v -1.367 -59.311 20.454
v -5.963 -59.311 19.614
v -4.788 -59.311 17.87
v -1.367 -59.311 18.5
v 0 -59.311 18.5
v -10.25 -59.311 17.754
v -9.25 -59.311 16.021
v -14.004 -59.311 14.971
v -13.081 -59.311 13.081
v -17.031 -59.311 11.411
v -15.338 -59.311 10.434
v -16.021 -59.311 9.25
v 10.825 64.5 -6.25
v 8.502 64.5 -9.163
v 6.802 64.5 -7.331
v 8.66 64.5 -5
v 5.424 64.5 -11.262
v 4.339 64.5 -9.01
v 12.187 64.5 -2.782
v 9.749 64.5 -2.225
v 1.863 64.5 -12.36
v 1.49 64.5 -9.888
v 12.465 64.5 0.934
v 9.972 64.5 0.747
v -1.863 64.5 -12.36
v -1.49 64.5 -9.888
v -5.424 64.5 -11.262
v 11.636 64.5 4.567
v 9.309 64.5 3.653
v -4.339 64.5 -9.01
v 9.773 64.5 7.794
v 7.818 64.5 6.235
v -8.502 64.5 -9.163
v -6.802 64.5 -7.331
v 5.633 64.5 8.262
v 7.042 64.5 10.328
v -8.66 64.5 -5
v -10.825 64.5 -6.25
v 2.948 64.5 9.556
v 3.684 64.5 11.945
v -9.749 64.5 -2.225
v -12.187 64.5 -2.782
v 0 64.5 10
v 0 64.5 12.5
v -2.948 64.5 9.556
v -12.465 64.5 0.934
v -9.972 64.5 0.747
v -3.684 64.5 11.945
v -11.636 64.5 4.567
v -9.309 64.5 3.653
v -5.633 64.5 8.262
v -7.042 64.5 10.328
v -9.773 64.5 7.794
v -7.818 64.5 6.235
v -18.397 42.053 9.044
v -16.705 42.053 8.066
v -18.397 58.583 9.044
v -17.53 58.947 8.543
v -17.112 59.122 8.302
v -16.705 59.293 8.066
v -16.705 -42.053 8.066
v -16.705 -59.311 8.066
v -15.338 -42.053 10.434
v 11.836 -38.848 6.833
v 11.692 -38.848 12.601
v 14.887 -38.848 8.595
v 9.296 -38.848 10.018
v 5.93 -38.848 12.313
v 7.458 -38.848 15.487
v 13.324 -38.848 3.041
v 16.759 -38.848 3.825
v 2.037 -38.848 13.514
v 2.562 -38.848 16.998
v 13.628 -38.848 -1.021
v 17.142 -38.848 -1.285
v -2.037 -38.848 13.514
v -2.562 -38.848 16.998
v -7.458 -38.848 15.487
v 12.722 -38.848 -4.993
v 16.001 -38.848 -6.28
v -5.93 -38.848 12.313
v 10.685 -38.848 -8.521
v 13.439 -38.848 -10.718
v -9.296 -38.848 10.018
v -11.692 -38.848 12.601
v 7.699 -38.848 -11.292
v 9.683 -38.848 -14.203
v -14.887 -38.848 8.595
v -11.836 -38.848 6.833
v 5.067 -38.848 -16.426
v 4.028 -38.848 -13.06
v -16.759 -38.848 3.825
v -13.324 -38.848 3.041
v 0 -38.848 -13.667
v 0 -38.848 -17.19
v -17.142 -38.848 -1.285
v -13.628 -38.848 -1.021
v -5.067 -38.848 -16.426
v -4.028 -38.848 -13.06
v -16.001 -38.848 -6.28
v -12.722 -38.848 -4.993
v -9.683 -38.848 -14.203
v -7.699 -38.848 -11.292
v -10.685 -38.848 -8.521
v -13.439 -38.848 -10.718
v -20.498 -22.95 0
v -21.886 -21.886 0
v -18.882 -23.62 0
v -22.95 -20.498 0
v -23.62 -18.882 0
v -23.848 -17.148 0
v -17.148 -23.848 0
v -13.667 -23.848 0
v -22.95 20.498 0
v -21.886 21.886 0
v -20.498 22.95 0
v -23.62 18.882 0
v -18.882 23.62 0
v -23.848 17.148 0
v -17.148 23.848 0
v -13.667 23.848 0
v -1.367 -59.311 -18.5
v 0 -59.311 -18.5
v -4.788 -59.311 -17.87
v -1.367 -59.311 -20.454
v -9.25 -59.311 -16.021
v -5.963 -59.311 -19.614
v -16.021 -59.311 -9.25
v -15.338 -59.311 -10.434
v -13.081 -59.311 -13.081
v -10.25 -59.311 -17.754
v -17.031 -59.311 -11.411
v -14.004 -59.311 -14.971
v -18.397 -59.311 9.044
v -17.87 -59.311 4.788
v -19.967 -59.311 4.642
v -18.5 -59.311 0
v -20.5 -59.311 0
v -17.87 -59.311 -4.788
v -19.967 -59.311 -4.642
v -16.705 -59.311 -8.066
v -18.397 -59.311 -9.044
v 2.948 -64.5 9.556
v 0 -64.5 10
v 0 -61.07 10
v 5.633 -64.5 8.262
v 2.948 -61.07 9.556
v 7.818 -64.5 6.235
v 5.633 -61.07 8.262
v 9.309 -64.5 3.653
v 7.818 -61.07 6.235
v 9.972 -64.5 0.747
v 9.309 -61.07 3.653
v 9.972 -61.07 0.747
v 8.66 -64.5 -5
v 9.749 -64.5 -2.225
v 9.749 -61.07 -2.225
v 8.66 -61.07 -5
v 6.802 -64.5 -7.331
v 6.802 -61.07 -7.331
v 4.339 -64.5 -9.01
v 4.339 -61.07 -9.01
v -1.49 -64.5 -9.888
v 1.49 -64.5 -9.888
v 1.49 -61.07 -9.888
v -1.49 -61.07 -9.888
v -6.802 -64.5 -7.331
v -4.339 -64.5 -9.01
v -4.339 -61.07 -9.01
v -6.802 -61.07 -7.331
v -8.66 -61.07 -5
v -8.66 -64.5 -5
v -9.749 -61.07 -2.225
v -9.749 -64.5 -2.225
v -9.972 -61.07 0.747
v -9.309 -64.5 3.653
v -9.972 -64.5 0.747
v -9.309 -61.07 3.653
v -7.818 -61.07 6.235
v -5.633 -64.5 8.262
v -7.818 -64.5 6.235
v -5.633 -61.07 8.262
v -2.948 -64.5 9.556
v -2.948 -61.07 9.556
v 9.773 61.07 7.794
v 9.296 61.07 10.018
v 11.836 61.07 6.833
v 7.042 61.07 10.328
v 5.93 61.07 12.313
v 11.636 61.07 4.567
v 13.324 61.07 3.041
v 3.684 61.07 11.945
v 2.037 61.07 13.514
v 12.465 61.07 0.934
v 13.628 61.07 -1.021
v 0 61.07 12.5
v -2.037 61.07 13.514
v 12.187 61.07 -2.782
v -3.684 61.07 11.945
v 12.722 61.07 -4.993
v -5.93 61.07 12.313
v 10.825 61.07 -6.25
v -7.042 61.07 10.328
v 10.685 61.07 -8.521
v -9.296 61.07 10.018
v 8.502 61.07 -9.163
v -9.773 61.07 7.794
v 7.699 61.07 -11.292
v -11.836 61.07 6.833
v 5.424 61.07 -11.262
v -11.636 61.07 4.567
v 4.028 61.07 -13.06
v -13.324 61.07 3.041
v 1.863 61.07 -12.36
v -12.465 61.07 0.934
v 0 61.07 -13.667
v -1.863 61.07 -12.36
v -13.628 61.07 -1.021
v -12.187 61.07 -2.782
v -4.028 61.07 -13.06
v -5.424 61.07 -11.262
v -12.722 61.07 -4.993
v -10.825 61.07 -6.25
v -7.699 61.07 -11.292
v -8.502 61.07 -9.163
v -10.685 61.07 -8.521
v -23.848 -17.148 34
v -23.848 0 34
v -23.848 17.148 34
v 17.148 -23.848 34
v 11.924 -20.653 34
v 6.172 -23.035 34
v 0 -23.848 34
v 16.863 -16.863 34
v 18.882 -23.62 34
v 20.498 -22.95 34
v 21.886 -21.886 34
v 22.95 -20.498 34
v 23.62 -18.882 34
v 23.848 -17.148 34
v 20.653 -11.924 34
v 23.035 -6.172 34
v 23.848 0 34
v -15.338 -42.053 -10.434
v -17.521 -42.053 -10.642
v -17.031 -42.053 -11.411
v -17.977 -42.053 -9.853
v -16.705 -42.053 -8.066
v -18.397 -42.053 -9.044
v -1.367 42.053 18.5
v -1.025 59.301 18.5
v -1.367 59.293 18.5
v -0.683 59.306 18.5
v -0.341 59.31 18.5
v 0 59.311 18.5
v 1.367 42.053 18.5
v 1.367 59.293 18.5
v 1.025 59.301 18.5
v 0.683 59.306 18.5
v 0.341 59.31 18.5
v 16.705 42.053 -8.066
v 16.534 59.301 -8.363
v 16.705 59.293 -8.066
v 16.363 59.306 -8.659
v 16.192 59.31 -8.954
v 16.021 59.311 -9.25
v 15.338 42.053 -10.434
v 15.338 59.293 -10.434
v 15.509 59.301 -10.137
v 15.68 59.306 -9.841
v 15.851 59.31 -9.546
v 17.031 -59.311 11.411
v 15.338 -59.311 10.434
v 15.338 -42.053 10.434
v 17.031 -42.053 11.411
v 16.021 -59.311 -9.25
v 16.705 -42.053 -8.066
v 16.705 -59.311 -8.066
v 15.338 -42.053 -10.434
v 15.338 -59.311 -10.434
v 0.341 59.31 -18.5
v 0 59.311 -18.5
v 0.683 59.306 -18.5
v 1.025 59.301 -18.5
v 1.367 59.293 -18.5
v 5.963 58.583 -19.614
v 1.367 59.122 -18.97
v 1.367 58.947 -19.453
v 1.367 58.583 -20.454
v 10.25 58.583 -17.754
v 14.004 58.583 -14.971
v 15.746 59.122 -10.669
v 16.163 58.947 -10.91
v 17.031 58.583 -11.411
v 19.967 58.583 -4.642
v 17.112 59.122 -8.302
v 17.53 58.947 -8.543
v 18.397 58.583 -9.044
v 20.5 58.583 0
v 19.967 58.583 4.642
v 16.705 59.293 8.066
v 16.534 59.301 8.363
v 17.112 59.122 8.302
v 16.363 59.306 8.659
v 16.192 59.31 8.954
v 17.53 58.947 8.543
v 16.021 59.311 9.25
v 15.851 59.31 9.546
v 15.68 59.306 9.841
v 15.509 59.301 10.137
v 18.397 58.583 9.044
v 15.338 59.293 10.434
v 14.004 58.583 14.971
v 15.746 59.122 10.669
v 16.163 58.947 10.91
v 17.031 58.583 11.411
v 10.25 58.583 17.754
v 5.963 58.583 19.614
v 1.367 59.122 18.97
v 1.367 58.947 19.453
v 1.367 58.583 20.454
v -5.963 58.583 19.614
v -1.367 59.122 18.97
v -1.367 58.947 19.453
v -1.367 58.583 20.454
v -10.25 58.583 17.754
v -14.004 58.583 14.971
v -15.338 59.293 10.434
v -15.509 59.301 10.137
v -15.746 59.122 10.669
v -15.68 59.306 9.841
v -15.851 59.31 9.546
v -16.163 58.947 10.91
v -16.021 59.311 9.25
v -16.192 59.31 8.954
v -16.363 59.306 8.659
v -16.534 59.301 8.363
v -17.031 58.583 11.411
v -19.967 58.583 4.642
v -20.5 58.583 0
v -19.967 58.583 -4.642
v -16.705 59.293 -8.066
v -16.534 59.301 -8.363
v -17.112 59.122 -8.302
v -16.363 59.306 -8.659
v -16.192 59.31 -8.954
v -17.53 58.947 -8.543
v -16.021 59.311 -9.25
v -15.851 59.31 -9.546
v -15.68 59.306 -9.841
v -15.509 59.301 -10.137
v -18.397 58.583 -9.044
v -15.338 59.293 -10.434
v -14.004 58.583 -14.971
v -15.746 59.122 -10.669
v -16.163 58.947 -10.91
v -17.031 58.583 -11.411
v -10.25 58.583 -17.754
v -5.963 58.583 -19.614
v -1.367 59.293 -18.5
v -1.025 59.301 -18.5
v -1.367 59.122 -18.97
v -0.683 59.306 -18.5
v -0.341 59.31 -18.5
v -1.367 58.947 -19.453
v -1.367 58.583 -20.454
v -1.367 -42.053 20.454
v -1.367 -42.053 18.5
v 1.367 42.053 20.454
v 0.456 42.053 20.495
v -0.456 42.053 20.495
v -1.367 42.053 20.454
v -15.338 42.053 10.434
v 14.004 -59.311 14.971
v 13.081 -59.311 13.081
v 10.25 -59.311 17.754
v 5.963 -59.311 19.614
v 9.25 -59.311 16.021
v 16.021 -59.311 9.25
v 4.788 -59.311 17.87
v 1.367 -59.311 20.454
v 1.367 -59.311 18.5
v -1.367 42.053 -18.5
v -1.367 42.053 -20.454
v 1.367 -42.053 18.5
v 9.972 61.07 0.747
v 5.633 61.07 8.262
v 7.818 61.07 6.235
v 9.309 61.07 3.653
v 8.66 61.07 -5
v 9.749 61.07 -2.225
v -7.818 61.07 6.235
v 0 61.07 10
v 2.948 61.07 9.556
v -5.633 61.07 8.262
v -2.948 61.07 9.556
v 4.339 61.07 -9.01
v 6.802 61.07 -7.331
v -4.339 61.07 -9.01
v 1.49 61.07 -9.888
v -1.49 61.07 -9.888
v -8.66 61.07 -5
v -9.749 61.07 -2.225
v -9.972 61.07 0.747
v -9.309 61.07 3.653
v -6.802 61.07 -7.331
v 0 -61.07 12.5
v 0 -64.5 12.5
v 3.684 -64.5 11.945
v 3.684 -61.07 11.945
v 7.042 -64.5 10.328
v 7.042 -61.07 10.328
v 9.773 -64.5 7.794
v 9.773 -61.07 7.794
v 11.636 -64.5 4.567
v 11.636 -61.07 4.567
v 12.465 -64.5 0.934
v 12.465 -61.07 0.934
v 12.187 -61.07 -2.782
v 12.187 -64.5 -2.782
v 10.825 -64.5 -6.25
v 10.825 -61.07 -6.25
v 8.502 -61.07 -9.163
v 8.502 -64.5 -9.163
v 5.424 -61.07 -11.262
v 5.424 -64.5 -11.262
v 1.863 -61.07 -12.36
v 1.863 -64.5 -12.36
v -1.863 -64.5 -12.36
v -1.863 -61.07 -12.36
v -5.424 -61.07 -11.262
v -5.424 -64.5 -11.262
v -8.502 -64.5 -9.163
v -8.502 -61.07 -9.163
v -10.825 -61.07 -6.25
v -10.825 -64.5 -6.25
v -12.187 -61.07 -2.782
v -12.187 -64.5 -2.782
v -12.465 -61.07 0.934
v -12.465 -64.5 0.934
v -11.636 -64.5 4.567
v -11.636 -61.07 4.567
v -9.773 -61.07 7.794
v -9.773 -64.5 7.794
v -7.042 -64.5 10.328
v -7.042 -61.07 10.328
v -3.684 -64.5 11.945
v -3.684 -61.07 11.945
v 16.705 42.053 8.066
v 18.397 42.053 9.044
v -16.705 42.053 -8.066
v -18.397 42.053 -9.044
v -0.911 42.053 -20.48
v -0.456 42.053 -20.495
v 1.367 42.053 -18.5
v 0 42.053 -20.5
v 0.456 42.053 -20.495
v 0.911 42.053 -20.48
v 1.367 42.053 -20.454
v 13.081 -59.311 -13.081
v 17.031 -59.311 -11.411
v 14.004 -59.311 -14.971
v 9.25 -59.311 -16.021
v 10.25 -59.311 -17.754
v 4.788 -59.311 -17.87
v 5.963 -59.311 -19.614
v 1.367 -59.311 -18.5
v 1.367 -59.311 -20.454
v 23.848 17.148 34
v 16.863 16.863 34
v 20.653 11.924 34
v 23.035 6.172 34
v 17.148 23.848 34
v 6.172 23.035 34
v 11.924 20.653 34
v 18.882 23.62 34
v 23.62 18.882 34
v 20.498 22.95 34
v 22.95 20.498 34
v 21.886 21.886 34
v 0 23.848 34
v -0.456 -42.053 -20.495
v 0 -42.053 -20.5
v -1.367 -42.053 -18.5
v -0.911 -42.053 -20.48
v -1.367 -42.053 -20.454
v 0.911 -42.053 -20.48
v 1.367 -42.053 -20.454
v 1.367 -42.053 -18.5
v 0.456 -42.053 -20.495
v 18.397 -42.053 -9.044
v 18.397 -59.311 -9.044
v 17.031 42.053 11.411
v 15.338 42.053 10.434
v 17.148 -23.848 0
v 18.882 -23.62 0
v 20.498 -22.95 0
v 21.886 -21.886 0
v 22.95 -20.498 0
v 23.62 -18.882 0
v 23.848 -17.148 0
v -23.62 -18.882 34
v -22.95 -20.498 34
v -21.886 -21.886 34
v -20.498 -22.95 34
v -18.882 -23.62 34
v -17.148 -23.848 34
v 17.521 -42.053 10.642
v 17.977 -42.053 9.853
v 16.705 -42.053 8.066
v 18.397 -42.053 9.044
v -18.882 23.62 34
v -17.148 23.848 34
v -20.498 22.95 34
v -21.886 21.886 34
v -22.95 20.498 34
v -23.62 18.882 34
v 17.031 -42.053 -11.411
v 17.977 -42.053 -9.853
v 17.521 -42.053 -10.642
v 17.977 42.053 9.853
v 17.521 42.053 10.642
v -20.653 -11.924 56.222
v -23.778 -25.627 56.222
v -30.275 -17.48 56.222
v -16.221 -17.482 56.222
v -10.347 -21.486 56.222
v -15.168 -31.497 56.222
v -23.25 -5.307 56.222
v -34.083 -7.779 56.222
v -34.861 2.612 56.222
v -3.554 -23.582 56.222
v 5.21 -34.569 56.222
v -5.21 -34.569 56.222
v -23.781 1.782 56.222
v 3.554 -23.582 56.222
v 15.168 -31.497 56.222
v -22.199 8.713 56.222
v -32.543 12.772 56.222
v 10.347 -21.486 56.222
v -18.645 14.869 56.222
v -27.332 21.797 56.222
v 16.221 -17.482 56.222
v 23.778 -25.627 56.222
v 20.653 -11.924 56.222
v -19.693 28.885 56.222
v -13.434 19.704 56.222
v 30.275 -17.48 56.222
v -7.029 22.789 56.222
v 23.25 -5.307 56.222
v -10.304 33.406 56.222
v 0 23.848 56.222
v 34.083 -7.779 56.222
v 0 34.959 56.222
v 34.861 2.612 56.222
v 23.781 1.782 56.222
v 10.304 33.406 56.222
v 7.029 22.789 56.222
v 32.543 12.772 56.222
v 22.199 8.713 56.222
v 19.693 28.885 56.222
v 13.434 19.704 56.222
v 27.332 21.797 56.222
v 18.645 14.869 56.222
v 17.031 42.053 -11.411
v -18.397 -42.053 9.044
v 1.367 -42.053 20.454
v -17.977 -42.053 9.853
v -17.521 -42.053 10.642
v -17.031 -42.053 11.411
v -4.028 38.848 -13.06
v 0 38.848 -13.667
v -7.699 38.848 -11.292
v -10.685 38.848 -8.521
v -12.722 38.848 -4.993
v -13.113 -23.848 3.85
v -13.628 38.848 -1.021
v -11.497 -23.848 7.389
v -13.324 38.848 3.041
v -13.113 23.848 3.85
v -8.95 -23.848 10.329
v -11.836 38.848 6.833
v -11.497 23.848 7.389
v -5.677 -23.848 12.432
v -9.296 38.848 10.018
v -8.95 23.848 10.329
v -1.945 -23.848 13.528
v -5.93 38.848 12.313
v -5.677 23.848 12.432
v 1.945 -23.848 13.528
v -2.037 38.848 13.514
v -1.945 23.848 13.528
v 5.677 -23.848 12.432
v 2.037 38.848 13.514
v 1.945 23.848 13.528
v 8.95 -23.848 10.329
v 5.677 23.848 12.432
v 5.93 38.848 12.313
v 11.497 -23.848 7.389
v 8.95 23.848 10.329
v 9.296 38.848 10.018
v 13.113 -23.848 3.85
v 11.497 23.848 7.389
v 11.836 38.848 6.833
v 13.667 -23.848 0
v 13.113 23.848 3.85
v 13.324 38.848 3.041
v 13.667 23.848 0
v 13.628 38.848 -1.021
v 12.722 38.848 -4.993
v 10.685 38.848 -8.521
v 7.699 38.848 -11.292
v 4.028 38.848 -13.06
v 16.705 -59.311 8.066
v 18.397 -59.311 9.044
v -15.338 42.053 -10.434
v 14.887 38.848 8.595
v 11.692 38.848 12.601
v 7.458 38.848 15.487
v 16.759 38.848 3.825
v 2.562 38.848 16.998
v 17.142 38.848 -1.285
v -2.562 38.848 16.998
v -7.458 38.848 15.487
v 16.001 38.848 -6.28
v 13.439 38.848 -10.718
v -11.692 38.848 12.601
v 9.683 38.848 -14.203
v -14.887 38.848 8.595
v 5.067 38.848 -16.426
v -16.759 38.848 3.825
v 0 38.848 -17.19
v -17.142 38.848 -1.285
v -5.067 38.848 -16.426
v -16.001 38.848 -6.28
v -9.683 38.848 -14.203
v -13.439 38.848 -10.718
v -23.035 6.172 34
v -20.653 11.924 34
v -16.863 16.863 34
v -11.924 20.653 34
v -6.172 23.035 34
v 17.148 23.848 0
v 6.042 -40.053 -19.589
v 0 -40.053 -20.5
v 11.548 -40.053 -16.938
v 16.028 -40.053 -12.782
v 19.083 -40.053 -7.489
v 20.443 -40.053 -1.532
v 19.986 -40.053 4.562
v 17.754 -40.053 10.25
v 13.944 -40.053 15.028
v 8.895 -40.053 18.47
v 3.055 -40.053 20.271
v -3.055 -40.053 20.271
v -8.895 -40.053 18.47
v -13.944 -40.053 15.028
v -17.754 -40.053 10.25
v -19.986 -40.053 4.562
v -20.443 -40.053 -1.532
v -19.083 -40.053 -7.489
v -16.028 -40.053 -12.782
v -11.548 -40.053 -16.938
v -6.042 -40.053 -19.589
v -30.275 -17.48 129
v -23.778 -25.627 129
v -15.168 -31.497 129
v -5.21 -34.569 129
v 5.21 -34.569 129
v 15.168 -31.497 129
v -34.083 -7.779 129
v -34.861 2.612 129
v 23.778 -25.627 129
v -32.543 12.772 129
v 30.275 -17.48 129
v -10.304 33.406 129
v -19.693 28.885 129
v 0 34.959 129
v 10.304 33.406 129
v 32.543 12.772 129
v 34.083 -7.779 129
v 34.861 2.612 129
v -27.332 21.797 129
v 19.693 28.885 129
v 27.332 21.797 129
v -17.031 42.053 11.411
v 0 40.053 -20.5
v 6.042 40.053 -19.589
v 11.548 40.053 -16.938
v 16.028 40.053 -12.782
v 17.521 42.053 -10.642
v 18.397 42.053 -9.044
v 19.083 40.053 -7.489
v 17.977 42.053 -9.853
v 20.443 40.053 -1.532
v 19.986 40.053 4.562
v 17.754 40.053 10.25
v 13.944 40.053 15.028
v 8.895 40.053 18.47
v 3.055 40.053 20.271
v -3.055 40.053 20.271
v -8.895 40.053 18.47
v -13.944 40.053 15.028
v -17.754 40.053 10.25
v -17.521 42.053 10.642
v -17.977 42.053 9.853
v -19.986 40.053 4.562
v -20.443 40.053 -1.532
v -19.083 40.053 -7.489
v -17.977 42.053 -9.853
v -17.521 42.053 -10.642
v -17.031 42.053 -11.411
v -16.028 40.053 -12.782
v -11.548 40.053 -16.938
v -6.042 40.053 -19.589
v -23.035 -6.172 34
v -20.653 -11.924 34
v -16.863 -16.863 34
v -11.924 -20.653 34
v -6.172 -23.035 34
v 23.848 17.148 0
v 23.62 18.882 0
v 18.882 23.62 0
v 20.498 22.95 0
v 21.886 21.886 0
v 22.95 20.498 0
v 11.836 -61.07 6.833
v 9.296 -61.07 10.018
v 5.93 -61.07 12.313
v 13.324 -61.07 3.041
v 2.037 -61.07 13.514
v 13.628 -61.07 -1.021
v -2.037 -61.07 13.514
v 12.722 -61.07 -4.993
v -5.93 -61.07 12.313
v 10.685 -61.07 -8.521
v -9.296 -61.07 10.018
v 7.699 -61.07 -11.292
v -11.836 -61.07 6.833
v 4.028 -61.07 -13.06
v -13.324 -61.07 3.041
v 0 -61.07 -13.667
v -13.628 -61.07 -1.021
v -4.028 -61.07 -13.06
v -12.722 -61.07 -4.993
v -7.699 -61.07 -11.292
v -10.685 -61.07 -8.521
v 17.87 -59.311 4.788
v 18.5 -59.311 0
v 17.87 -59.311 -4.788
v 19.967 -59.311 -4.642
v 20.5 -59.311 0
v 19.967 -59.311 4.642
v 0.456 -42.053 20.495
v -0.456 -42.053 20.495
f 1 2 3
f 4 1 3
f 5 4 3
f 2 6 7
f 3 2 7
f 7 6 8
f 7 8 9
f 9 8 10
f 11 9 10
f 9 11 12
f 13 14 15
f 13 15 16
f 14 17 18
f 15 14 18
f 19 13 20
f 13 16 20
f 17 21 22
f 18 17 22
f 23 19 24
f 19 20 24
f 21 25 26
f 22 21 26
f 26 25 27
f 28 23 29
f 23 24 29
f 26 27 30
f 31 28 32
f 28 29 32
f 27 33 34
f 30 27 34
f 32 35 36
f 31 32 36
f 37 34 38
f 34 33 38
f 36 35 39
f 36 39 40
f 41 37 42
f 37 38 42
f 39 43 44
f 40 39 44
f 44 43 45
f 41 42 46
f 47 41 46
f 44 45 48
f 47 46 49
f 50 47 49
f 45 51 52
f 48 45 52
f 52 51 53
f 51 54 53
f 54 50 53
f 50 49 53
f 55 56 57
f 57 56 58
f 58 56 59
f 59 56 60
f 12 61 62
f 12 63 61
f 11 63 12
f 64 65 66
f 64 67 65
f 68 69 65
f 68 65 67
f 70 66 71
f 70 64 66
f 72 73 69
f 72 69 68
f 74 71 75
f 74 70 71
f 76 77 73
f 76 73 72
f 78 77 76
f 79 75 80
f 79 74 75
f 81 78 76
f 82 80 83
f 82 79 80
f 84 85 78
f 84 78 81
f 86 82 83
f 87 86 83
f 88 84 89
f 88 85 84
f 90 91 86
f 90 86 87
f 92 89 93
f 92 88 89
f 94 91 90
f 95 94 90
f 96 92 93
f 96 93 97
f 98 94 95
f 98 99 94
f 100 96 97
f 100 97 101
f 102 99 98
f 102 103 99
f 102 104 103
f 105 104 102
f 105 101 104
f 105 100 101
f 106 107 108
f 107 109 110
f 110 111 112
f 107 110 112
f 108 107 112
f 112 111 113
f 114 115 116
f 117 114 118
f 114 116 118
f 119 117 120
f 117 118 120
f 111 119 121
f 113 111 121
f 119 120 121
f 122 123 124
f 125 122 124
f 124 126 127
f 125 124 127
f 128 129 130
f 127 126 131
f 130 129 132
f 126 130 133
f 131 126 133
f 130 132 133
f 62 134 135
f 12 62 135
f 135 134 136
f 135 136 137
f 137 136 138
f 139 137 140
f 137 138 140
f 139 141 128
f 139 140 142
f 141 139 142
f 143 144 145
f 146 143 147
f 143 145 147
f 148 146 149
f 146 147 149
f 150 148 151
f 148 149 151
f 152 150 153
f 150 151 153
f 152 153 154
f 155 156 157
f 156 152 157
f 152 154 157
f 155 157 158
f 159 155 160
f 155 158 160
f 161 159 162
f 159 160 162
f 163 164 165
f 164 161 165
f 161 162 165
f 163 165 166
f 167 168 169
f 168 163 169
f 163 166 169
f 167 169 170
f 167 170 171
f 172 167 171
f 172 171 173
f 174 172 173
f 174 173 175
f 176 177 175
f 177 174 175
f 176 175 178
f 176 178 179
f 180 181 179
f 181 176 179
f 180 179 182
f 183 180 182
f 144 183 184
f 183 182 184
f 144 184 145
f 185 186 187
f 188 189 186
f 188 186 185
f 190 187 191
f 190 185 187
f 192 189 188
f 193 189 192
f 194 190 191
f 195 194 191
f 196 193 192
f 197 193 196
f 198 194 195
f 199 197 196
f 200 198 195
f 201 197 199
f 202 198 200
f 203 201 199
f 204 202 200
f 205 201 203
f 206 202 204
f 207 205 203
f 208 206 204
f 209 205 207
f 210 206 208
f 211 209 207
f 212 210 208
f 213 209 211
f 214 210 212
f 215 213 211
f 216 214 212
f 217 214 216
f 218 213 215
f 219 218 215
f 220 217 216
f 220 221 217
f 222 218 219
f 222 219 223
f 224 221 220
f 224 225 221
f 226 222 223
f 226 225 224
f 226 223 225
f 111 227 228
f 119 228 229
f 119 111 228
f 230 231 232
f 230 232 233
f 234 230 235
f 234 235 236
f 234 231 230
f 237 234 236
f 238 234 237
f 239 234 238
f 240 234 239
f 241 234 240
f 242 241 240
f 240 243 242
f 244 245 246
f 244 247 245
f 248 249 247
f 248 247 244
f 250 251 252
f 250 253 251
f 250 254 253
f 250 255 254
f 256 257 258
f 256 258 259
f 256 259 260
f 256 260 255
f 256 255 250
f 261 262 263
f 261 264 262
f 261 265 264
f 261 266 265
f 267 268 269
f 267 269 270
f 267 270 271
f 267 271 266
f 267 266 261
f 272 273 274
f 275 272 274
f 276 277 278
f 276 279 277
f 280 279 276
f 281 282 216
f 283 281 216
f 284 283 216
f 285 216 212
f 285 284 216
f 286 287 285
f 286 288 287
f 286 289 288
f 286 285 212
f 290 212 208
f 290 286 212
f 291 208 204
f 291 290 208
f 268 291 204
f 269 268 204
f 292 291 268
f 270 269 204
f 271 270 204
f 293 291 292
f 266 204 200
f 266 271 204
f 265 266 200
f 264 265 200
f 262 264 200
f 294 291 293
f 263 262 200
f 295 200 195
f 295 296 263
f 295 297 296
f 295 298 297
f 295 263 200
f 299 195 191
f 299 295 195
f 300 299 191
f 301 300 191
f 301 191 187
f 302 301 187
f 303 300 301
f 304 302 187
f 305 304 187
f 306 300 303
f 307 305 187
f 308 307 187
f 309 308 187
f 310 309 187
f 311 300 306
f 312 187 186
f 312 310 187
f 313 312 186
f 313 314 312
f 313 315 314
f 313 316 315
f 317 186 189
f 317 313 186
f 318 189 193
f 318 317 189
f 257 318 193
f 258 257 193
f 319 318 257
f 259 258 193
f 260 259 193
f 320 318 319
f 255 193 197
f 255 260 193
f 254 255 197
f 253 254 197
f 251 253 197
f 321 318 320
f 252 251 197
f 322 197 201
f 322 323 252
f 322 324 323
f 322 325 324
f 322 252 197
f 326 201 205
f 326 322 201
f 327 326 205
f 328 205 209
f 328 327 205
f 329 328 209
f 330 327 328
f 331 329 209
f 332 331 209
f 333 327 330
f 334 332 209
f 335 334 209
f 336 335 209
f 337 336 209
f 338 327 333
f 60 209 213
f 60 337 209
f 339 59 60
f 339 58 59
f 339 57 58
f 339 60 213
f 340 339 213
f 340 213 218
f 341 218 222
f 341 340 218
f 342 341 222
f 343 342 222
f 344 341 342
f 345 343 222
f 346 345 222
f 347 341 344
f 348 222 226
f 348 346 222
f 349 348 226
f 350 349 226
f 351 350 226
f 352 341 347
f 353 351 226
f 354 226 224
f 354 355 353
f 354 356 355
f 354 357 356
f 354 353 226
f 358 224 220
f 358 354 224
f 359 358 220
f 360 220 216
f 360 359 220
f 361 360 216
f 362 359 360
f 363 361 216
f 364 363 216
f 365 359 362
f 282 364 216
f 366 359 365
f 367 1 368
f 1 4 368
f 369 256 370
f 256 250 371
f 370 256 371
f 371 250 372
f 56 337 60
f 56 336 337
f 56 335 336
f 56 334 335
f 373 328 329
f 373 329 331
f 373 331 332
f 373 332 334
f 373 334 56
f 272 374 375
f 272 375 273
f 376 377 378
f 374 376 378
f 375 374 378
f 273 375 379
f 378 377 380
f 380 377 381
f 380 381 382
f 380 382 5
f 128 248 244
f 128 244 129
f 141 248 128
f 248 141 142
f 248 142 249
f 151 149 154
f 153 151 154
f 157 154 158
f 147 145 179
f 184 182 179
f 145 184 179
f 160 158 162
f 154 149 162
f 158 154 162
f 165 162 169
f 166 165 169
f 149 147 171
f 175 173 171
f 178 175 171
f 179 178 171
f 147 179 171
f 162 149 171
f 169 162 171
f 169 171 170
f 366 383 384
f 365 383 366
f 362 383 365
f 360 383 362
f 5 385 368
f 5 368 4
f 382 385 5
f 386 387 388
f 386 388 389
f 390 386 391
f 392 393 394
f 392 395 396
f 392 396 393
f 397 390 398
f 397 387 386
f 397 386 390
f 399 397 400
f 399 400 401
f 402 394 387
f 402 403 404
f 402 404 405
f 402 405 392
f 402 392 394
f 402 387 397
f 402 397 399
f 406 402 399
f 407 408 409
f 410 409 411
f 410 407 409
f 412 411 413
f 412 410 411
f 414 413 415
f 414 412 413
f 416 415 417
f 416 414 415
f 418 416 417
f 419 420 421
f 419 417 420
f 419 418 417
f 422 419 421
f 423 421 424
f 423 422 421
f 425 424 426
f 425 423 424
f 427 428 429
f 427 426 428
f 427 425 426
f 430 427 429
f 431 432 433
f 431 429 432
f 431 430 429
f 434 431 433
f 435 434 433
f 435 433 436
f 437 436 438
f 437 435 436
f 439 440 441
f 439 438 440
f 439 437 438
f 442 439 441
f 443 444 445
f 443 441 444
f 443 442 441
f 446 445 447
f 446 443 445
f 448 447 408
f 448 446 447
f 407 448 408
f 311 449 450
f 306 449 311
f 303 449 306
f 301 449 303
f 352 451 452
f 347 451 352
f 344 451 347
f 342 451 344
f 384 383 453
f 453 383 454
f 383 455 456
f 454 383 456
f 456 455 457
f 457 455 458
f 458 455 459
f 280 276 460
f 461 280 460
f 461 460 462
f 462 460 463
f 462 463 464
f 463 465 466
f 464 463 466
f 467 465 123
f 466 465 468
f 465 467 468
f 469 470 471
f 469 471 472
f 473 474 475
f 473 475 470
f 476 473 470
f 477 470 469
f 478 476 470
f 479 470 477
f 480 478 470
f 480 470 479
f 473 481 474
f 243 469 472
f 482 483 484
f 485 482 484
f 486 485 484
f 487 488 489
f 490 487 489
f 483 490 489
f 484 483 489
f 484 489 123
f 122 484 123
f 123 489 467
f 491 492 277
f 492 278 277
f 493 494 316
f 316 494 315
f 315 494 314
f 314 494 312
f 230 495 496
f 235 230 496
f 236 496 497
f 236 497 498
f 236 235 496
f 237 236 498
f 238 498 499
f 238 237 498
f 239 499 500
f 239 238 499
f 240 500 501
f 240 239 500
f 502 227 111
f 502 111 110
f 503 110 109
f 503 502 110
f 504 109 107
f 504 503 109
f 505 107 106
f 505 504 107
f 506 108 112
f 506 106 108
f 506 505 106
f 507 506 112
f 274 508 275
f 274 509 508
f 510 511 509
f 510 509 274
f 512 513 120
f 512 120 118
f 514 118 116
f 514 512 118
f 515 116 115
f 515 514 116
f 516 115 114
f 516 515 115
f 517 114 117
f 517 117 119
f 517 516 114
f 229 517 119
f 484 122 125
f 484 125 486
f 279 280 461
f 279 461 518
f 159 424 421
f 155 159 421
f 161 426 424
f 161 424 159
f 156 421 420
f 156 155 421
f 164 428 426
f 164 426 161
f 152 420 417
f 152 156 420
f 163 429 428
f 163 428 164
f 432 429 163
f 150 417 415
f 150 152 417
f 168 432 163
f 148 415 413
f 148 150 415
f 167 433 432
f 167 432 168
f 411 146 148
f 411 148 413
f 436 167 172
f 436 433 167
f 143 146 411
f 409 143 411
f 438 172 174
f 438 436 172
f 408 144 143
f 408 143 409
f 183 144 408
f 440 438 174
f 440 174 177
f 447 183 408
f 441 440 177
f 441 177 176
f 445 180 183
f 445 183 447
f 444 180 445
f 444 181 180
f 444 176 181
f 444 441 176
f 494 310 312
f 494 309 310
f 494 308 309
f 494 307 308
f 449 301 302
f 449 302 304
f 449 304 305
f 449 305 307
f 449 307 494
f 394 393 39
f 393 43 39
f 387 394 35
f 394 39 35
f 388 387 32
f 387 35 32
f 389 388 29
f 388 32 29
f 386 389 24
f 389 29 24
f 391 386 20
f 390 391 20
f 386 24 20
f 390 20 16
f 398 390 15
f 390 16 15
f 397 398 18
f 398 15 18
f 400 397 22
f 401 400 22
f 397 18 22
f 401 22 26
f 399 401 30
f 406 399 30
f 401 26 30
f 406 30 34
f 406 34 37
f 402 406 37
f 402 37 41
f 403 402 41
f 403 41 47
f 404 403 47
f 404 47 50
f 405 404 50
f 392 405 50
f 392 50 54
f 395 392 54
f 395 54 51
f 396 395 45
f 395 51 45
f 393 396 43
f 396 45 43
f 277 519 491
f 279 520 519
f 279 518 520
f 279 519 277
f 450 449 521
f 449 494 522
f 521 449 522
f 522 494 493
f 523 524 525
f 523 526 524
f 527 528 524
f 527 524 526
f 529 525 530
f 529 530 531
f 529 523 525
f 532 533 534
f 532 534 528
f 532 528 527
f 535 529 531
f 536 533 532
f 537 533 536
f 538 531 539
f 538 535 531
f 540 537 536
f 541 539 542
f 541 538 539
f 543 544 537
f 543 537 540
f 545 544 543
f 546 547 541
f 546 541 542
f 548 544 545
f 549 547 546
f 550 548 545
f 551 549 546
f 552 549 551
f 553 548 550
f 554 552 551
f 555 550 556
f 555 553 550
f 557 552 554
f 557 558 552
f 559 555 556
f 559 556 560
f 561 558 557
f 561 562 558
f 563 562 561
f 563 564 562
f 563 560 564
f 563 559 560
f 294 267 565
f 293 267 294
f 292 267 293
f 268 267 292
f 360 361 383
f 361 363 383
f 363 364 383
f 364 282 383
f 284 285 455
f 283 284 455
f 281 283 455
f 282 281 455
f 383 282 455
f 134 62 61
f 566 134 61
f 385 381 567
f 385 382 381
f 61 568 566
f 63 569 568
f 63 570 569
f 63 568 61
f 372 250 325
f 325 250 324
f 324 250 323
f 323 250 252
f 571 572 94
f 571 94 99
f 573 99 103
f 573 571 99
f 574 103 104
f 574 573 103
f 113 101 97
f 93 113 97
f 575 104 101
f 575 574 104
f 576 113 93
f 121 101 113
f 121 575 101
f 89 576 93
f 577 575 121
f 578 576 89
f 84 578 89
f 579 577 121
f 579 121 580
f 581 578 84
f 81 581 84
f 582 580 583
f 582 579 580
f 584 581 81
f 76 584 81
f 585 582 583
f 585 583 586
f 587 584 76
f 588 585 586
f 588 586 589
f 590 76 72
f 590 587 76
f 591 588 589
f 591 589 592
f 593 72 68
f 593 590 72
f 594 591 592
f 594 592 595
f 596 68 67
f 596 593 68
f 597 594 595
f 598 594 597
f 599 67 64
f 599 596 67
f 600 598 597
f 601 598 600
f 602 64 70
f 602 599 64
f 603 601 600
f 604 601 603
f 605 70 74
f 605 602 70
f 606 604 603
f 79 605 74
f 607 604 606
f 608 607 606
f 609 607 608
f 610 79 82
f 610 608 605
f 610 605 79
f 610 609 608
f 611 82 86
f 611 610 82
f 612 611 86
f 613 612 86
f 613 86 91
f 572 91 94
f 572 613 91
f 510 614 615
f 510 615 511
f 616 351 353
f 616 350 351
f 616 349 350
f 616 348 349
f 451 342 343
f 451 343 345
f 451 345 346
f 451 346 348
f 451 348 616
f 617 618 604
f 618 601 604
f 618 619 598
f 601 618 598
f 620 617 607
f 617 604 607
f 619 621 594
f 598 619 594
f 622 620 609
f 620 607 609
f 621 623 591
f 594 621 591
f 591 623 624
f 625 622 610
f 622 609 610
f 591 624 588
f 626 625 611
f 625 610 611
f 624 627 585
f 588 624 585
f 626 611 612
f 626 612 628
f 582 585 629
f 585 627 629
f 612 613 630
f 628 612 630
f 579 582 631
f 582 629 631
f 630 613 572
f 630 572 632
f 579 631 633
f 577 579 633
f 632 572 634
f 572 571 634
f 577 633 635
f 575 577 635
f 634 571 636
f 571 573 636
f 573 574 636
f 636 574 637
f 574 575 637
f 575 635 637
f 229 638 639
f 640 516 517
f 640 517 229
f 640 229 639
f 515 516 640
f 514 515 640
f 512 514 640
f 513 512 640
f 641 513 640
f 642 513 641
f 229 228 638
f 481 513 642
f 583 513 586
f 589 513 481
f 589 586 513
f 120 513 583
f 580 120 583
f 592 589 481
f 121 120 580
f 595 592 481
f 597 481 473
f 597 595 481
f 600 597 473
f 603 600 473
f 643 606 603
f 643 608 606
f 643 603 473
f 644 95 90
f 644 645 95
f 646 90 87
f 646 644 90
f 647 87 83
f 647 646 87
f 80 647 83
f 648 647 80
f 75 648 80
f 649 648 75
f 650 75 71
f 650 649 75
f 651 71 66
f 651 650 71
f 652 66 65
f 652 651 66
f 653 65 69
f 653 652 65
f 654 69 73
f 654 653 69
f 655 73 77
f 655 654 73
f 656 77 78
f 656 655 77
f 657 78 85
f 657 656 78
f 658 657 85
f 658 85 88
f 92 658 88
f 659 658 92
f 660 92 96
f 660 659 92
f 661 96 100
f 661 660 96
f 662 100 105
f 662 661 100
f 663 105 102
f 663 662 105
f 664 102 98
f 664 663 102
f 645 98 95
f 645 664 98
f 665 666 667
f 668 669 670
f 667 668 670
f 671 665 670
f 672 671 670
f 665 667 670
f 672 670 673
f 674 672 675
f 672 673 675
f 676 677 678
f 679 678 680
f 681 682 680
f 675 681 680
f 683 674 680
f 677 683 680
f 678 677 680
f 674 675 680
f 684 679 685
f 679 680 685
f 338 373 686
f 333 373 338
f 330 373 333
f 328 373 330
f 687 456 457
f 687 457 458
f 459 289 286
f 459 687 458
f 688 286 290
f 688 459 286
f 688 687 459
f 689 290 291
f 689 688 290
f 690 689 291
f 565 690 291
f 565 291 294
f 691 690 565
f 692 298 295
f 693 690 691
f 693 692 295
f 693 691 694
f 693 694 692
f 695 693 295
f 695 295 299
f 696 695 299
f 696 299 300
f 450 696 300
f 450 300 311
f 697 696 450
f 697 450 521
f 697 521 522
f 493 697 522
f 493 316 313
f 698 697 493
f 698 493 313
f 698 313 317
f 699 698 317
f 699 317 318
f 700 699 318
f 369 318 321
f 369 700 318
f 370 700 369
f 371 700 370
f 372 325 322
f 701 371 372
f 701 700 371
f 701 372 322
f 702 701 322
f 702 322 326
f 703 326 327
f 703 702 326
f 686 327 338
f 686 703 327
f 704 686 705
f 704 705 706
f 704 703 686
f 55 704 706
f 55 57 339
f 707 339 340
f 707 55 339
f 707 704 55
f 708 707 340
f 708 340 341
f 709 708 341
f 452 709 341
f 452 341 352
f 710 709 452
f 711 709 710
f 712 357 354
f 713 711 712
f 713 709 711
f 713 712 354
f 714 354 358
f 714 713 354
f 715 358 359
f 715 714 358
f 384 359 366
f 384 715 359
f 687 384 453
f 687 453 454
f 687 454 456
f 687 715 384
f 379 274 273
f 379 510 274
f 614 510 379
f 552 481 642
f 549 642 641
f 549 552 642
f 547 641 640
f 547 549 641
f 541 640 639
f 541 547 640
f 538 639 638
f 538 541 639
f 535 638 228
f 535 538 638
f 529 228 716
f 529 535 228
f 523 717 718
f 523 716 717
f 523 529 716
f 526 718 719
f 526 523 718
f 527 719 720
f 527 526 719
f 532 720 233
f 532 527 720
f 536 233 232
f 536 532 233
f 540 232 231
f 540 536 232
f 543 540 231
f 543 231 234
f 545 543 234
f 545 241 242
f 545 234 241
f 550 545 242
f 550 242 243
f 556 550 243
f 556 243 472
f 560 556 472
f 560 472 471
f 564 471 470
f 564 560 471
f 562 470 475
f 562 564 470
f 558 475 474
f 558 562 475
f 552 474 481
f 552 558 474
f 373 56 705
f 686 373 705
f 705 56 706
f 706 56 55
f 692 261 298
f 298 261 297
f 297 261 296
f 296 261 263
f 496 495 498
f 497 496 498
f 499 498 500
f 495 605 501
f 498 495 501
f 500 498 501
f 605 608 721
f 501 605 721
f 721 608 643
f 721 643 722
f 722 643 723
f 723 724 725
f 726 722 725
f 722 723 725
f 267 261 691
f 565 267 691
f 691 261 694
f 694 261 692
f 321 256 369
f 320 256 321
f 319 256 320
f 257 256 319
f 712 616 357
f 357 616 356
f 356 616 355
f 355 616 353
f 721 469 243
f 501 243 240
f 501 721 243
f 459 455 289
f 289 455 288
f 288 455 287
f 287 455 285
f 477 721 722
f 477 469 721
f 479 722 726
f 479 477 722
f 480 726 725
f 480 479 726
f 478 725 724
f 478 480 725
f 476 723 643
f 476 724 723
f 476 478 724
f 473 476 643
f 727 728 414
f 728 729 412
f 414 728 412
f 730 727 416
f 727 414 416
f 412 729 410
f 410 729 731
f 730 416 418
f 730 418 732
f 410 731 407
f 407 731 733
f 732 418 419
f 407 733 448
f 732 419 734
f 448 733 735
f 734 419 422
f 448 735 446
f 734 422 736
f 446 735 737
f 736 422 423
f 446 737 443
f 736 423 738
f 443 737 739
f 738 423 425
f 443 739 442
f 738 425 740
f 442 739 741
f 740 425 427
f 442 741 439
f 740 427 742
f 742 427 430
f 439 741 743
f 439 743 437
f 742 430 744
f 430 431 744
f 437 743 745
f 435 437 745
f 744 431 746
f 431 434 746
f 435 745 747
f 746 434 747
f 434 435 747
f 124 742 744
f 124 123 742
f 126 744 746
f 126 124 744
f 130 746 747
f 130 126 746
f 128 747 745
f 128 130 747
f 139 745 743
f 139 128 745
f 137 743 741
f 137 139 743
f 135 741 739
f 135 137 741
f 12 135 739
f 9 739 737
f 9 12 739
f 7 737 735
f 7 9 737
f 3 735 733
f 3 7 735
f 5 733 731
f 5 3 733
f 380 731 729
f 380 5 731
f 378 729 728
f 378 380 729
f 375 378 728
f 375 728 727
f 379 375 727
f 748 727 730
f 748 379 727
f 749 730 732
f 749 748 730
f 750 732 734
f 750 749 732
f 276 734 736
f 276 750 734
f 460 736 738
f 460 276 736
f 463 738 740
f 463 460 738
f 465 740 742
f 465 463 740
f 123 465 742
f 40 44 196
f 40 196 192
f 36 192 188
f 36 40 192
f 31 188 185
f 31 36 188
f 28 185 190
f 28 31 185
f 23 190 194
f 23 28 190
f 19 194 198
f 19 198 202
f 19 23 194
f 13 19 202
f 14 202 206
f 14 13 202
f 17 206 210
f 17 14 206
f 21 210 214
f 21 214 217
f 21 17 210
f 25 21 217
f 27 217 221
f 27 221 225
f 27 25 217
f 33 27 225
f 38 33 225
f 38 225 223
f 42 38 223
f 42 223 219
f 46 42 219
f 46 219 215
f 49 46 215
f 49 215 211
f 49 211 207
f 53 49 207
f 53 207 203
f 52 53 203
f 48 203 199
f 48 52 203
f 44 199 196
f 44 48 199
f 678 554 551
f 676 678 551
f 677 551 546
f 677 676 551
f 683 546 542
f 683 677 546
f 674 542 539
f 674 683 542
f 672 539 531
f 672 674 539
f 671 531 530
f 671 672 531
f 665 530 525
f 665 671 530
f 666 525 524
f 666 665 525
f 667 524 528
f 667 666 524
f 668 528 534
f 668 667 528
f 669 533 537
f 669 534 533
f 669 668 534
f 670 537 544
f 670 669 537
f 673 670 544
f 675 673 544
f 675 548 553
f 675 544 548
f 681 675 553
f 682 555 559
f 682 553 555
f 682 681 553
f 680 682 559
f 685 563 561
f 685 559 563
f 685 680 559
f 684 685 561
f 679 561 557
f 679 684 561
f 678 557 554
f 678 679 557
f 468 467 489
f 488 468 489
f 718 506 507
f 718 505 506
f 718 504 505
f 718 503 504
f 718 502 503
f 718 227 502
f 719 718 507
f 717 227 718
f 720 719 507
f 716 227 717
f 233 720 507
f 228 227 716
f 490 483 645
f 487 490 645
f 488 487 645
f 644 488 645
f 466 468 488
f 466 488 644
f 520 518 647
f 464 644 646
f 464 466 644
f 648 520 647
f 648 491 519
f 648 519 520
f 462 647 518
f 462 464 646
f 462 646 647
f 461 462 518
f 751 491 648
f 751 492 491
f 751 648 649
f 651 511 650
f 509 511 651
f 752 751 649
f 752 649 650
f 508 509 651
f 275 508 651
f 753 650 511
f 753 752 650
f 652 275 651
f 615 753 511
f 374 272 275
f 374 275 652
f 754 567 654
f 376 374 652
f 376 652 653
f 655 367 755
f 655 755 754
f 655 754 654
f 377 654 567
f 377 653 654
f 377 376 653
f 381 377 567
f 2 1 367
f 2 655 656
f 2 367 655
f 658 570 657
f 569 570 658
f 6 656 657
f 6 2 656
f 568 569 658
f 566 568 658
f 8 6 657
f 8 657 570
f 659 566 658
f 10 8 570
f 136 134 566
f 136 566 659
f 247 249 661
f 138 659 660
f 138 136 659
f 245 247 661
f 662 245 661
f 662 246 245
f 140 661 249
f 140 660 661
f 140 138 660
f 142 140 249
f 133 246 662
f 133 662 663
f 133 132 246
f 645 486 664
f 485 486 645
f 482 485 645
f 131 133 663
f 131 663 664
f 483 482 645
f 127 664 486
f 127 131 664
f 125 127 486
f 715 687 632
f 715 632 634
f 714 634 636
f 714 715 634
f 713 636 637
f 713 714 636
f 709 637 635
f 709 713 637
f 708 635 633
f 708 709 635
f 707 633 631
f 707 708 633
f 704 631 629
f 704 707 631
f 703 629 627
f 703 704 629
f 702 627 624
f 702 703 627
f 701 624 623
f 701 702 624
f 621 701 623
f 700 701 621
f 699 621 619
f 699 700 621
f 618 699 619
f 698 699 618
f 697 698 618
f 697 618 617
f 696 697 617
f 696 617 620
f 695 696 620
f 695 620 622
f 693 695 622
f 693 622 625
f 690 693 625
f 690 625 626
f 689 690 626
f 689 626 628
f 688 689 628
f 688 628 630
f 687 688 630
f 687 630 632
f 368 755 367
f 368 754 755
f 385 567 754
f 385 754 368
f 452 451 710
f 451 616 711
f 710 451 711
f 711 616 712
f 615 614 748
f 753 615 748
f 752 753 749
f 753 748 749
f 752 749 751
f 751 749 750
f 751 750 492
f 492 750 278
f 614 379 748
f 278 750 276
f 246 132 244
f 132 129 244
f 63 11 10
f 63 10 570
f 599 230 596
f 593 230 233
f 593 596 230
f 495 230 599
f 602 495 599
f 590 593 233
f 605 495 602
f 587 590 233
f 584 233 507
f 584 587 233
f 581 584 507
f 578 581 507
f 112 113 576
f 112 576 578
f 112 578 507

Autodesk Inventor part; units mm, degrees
ref_plane "YZ Plane" through (0, 0, 0) normal (1, 0, 0) x (0, 1, 0)
ref_plane "XZ Plane" through (0, 0, 0) normal (0, 1, 0) x (-1, 0, 0)
ref_plane "XY Plane" through (0, 0, 0) normal (0, 0, 1) x (1, 0, 0)
sketch "Sketch_1" plane through (0, 0, 0) normal (1, 0, 0) x (0, 1, 0)
  line L0 (61.0702, 0) -> (61.0702, -13.6667)
  line L1 (61.0702, -13.6667) -> (58.5831, -20.5)
  line L2 (58.5831, -20.5) -> (40.0529, -20.5)
  line L3 (40.0529, -20.5) -> (38.848, -17.1896)
  line L4 (38.848, -17.1896) -> (38.848, -13.6667)
  line L5 (-38.848, -13.6667) -> (-38.848, -17.1896)
  line L6 (-38.848, -17.1896) -> (-40.0529, -20.5)
  line L7 (-40.0529, -20.5) -> (-58.5831, -20.5)
  line L8 (-58.5831, -20.5) -> (-61.0702, -13.6667)
  line L9 (-61.0702, -13.6667) -> (-61.0702, 0)
  line L10 (-61.0702, 0) -> (61.0702, 0)
  line L11 (-40.0529, -20.5) -> (0, -20.5) construction
  line L12 (0, -20.5) -> (0, -30.1874) construction
  line L13 (-59.3111, -20.5) -> (-42.0529, -20.5)
  line L14 (-42.0529, -20.5) -> (-42.0529, -18.5)
  line L15 (-42.0529, -18.5) -> (-59.3111, -18.5)
  line L16 (-59.3111, -18.5) -> (-59.3111, -20.5)
  line L17 (42.0529, -20.5) -> (59.3111, -20.5)
  line L18 (59.3111, -20.5) -> (59.3111, -18.5)
  line L19 (59.3111, -18.5) -> (42.0529, -18.5)
  line L20 (42.0529, -18.5) -> (42.0529, -20.5)
  line L21 (-38.848, -13.6667) -> (38.848, -13.6667)
  point P0 (0, 0)
  point P1 (0, 0)
  point P2 (-49.318, -20.5)
  point P3 (50.682, -20.5)
  point P4 (0, 0)
  dimension "dimE" = 41
  dimension "d22" = 20.5
  dimension "d23" = 6.8333
  dimension "d24" = 20
  dimension "d27" = 22.2222
  dimension "d28" = 22.2222
  dimension "d52" = 20
  dimension "d53" = 2
  dimension "d54" = 2
  dimension "d55" = 2
  dimension "dimZ" = 100
revolve "Revolution1" add sketch "Sketch_1" angle 360 about axis through (0, -61.0702, 0) along (0, 1, 0) contours L0 L1 L19 L20 L2 L3 L4 L21 L5 L6 L7 L14 L15 L8 L9 L10 | L1 L2 L20 L19 | L15 L14 L7 L8 | L8 L13 L16
sketch "Sketch11" plane through (0, 0, 0) normal (0, 0, 1) x (1, 0, 0)
  line L0 (-23.848, 23.848) -> (23.848, 23.848)
  line L1 (23.848, 23.848) -> (23.848, -23.848)
  line L2 (23.848, -23.848) -> (-23.848, -23.848)
  line L3 (-23.848, -23.848) -> (-23.848, 23.848)
  line L4 (23.848, -23.848) -> (-23.848, 23.848)
  line L5 (17.1896, 38.848) -> (-17.1896, 38.848) projected
  point P0 (0, 0)
  point P1 (0, 0)
  point P2 (0, 0)
  dimension "d71" = 15
extrude "Extrusion6" add sketch "Sketch11" along normal blind 34
sketch "Sketch_2" plane through (0, 0, 0) normal (1, 0, 0) x (0, 1, 0)
  line L0 (0, 34) -> (23.848, 34)
  line L1 (23.848, 34) -> (23.848, 56.2222)
  line L2 (23.848, 56.2222) -> (0, 56.2222)
  line L3 (0, 56.2222) -> (0, 34)
  line L4 (0, 56.2222) -> (34.9591, 56.2222)
  line L5 (34.9591, 56.2222) -> (34.9591, 129)
  line L6 (34.9591, 129) -> (0, 129)
  line L7 (0, 129) -> (0, 56.2222)
  line L8 (-33.3229, 0) -> (54.4515, 0)
  line L9 (-90.3, 0) -> (90.3, 0) projected
  line L10 (0, -319.9275) -> (0, 424.6014) projected
  point P0 (10.5643, 0)
  dimension "d67" = 22.2222
  dimension "d68" = 129
  dimension "d70" = 11.1111
revolve "Revolution2" add sketch "Sketch_2" angle 360 about axis through (0, 0, 129) along (0, 0, -1)
fillet "Fillet1" radius 6.7 4 edges at (-23.848, 23.848, 17) (-23.848, -23.848, 17) (23.848, -23.848, 17) (23.848, 23.848, 17)
sketch "Sketch_7" plane through (0, 0, 0) normal (1, 0, 0) x (0, 1, 0)
  line L0 (-64.5, 12.5) -> (64.5, 12.5)
  line L1 (48.5126, 0) -> (-48.5126, 0)
  line L2 (-64.5, 12.5) -> (-64.5, 10)
  line L3 (-64.5, 10) -> (64.5, 10)
  line L4 (64.5, 10) -> (64.5, 12.5)
  line L5 (0, 0.4963) -> (0, 17.9963)
  point P0 (0, 0)
  point P1 (0, 0)
  point P2 (0, 10)
  point P3 (0, 0)
  dimension "dimH" = 129
  dimension "dimD" = 20
  dimension "dimD2" = 25
revolve "Revolution3" add sketch "Sketch_7" angle 360 about axis through (0, 48.5126, 0) along (0, -1, 0)
extrude "Extrusion8" cut sketch "Sketch_1" along normal mid plane 2.7333 contours L18 L17 L1 | L1 L2 L20 L19 | L15 L14 L7 L8 | L8 L13 L16
pattern_circular "Circular Pattern1" count 6 over 360 about axis through (0, 32.25, 0) along (0, -1, 0) of "Extrusion8"
equation "\"d23\" = 0.333333 * d22"
equation "\"d27\" = 0.222222 * dimZ"
equation "\"d28\" = d27"
equation "\"d35\" = 0.1 * dimC"
equation "\"d47\" = 0.0666667 * dimE"
equation "\"dimC\" = 67"
properties part number "DIAPHRAGM VALVE PNEUMATIC GLUED DN15" material "PVC"
